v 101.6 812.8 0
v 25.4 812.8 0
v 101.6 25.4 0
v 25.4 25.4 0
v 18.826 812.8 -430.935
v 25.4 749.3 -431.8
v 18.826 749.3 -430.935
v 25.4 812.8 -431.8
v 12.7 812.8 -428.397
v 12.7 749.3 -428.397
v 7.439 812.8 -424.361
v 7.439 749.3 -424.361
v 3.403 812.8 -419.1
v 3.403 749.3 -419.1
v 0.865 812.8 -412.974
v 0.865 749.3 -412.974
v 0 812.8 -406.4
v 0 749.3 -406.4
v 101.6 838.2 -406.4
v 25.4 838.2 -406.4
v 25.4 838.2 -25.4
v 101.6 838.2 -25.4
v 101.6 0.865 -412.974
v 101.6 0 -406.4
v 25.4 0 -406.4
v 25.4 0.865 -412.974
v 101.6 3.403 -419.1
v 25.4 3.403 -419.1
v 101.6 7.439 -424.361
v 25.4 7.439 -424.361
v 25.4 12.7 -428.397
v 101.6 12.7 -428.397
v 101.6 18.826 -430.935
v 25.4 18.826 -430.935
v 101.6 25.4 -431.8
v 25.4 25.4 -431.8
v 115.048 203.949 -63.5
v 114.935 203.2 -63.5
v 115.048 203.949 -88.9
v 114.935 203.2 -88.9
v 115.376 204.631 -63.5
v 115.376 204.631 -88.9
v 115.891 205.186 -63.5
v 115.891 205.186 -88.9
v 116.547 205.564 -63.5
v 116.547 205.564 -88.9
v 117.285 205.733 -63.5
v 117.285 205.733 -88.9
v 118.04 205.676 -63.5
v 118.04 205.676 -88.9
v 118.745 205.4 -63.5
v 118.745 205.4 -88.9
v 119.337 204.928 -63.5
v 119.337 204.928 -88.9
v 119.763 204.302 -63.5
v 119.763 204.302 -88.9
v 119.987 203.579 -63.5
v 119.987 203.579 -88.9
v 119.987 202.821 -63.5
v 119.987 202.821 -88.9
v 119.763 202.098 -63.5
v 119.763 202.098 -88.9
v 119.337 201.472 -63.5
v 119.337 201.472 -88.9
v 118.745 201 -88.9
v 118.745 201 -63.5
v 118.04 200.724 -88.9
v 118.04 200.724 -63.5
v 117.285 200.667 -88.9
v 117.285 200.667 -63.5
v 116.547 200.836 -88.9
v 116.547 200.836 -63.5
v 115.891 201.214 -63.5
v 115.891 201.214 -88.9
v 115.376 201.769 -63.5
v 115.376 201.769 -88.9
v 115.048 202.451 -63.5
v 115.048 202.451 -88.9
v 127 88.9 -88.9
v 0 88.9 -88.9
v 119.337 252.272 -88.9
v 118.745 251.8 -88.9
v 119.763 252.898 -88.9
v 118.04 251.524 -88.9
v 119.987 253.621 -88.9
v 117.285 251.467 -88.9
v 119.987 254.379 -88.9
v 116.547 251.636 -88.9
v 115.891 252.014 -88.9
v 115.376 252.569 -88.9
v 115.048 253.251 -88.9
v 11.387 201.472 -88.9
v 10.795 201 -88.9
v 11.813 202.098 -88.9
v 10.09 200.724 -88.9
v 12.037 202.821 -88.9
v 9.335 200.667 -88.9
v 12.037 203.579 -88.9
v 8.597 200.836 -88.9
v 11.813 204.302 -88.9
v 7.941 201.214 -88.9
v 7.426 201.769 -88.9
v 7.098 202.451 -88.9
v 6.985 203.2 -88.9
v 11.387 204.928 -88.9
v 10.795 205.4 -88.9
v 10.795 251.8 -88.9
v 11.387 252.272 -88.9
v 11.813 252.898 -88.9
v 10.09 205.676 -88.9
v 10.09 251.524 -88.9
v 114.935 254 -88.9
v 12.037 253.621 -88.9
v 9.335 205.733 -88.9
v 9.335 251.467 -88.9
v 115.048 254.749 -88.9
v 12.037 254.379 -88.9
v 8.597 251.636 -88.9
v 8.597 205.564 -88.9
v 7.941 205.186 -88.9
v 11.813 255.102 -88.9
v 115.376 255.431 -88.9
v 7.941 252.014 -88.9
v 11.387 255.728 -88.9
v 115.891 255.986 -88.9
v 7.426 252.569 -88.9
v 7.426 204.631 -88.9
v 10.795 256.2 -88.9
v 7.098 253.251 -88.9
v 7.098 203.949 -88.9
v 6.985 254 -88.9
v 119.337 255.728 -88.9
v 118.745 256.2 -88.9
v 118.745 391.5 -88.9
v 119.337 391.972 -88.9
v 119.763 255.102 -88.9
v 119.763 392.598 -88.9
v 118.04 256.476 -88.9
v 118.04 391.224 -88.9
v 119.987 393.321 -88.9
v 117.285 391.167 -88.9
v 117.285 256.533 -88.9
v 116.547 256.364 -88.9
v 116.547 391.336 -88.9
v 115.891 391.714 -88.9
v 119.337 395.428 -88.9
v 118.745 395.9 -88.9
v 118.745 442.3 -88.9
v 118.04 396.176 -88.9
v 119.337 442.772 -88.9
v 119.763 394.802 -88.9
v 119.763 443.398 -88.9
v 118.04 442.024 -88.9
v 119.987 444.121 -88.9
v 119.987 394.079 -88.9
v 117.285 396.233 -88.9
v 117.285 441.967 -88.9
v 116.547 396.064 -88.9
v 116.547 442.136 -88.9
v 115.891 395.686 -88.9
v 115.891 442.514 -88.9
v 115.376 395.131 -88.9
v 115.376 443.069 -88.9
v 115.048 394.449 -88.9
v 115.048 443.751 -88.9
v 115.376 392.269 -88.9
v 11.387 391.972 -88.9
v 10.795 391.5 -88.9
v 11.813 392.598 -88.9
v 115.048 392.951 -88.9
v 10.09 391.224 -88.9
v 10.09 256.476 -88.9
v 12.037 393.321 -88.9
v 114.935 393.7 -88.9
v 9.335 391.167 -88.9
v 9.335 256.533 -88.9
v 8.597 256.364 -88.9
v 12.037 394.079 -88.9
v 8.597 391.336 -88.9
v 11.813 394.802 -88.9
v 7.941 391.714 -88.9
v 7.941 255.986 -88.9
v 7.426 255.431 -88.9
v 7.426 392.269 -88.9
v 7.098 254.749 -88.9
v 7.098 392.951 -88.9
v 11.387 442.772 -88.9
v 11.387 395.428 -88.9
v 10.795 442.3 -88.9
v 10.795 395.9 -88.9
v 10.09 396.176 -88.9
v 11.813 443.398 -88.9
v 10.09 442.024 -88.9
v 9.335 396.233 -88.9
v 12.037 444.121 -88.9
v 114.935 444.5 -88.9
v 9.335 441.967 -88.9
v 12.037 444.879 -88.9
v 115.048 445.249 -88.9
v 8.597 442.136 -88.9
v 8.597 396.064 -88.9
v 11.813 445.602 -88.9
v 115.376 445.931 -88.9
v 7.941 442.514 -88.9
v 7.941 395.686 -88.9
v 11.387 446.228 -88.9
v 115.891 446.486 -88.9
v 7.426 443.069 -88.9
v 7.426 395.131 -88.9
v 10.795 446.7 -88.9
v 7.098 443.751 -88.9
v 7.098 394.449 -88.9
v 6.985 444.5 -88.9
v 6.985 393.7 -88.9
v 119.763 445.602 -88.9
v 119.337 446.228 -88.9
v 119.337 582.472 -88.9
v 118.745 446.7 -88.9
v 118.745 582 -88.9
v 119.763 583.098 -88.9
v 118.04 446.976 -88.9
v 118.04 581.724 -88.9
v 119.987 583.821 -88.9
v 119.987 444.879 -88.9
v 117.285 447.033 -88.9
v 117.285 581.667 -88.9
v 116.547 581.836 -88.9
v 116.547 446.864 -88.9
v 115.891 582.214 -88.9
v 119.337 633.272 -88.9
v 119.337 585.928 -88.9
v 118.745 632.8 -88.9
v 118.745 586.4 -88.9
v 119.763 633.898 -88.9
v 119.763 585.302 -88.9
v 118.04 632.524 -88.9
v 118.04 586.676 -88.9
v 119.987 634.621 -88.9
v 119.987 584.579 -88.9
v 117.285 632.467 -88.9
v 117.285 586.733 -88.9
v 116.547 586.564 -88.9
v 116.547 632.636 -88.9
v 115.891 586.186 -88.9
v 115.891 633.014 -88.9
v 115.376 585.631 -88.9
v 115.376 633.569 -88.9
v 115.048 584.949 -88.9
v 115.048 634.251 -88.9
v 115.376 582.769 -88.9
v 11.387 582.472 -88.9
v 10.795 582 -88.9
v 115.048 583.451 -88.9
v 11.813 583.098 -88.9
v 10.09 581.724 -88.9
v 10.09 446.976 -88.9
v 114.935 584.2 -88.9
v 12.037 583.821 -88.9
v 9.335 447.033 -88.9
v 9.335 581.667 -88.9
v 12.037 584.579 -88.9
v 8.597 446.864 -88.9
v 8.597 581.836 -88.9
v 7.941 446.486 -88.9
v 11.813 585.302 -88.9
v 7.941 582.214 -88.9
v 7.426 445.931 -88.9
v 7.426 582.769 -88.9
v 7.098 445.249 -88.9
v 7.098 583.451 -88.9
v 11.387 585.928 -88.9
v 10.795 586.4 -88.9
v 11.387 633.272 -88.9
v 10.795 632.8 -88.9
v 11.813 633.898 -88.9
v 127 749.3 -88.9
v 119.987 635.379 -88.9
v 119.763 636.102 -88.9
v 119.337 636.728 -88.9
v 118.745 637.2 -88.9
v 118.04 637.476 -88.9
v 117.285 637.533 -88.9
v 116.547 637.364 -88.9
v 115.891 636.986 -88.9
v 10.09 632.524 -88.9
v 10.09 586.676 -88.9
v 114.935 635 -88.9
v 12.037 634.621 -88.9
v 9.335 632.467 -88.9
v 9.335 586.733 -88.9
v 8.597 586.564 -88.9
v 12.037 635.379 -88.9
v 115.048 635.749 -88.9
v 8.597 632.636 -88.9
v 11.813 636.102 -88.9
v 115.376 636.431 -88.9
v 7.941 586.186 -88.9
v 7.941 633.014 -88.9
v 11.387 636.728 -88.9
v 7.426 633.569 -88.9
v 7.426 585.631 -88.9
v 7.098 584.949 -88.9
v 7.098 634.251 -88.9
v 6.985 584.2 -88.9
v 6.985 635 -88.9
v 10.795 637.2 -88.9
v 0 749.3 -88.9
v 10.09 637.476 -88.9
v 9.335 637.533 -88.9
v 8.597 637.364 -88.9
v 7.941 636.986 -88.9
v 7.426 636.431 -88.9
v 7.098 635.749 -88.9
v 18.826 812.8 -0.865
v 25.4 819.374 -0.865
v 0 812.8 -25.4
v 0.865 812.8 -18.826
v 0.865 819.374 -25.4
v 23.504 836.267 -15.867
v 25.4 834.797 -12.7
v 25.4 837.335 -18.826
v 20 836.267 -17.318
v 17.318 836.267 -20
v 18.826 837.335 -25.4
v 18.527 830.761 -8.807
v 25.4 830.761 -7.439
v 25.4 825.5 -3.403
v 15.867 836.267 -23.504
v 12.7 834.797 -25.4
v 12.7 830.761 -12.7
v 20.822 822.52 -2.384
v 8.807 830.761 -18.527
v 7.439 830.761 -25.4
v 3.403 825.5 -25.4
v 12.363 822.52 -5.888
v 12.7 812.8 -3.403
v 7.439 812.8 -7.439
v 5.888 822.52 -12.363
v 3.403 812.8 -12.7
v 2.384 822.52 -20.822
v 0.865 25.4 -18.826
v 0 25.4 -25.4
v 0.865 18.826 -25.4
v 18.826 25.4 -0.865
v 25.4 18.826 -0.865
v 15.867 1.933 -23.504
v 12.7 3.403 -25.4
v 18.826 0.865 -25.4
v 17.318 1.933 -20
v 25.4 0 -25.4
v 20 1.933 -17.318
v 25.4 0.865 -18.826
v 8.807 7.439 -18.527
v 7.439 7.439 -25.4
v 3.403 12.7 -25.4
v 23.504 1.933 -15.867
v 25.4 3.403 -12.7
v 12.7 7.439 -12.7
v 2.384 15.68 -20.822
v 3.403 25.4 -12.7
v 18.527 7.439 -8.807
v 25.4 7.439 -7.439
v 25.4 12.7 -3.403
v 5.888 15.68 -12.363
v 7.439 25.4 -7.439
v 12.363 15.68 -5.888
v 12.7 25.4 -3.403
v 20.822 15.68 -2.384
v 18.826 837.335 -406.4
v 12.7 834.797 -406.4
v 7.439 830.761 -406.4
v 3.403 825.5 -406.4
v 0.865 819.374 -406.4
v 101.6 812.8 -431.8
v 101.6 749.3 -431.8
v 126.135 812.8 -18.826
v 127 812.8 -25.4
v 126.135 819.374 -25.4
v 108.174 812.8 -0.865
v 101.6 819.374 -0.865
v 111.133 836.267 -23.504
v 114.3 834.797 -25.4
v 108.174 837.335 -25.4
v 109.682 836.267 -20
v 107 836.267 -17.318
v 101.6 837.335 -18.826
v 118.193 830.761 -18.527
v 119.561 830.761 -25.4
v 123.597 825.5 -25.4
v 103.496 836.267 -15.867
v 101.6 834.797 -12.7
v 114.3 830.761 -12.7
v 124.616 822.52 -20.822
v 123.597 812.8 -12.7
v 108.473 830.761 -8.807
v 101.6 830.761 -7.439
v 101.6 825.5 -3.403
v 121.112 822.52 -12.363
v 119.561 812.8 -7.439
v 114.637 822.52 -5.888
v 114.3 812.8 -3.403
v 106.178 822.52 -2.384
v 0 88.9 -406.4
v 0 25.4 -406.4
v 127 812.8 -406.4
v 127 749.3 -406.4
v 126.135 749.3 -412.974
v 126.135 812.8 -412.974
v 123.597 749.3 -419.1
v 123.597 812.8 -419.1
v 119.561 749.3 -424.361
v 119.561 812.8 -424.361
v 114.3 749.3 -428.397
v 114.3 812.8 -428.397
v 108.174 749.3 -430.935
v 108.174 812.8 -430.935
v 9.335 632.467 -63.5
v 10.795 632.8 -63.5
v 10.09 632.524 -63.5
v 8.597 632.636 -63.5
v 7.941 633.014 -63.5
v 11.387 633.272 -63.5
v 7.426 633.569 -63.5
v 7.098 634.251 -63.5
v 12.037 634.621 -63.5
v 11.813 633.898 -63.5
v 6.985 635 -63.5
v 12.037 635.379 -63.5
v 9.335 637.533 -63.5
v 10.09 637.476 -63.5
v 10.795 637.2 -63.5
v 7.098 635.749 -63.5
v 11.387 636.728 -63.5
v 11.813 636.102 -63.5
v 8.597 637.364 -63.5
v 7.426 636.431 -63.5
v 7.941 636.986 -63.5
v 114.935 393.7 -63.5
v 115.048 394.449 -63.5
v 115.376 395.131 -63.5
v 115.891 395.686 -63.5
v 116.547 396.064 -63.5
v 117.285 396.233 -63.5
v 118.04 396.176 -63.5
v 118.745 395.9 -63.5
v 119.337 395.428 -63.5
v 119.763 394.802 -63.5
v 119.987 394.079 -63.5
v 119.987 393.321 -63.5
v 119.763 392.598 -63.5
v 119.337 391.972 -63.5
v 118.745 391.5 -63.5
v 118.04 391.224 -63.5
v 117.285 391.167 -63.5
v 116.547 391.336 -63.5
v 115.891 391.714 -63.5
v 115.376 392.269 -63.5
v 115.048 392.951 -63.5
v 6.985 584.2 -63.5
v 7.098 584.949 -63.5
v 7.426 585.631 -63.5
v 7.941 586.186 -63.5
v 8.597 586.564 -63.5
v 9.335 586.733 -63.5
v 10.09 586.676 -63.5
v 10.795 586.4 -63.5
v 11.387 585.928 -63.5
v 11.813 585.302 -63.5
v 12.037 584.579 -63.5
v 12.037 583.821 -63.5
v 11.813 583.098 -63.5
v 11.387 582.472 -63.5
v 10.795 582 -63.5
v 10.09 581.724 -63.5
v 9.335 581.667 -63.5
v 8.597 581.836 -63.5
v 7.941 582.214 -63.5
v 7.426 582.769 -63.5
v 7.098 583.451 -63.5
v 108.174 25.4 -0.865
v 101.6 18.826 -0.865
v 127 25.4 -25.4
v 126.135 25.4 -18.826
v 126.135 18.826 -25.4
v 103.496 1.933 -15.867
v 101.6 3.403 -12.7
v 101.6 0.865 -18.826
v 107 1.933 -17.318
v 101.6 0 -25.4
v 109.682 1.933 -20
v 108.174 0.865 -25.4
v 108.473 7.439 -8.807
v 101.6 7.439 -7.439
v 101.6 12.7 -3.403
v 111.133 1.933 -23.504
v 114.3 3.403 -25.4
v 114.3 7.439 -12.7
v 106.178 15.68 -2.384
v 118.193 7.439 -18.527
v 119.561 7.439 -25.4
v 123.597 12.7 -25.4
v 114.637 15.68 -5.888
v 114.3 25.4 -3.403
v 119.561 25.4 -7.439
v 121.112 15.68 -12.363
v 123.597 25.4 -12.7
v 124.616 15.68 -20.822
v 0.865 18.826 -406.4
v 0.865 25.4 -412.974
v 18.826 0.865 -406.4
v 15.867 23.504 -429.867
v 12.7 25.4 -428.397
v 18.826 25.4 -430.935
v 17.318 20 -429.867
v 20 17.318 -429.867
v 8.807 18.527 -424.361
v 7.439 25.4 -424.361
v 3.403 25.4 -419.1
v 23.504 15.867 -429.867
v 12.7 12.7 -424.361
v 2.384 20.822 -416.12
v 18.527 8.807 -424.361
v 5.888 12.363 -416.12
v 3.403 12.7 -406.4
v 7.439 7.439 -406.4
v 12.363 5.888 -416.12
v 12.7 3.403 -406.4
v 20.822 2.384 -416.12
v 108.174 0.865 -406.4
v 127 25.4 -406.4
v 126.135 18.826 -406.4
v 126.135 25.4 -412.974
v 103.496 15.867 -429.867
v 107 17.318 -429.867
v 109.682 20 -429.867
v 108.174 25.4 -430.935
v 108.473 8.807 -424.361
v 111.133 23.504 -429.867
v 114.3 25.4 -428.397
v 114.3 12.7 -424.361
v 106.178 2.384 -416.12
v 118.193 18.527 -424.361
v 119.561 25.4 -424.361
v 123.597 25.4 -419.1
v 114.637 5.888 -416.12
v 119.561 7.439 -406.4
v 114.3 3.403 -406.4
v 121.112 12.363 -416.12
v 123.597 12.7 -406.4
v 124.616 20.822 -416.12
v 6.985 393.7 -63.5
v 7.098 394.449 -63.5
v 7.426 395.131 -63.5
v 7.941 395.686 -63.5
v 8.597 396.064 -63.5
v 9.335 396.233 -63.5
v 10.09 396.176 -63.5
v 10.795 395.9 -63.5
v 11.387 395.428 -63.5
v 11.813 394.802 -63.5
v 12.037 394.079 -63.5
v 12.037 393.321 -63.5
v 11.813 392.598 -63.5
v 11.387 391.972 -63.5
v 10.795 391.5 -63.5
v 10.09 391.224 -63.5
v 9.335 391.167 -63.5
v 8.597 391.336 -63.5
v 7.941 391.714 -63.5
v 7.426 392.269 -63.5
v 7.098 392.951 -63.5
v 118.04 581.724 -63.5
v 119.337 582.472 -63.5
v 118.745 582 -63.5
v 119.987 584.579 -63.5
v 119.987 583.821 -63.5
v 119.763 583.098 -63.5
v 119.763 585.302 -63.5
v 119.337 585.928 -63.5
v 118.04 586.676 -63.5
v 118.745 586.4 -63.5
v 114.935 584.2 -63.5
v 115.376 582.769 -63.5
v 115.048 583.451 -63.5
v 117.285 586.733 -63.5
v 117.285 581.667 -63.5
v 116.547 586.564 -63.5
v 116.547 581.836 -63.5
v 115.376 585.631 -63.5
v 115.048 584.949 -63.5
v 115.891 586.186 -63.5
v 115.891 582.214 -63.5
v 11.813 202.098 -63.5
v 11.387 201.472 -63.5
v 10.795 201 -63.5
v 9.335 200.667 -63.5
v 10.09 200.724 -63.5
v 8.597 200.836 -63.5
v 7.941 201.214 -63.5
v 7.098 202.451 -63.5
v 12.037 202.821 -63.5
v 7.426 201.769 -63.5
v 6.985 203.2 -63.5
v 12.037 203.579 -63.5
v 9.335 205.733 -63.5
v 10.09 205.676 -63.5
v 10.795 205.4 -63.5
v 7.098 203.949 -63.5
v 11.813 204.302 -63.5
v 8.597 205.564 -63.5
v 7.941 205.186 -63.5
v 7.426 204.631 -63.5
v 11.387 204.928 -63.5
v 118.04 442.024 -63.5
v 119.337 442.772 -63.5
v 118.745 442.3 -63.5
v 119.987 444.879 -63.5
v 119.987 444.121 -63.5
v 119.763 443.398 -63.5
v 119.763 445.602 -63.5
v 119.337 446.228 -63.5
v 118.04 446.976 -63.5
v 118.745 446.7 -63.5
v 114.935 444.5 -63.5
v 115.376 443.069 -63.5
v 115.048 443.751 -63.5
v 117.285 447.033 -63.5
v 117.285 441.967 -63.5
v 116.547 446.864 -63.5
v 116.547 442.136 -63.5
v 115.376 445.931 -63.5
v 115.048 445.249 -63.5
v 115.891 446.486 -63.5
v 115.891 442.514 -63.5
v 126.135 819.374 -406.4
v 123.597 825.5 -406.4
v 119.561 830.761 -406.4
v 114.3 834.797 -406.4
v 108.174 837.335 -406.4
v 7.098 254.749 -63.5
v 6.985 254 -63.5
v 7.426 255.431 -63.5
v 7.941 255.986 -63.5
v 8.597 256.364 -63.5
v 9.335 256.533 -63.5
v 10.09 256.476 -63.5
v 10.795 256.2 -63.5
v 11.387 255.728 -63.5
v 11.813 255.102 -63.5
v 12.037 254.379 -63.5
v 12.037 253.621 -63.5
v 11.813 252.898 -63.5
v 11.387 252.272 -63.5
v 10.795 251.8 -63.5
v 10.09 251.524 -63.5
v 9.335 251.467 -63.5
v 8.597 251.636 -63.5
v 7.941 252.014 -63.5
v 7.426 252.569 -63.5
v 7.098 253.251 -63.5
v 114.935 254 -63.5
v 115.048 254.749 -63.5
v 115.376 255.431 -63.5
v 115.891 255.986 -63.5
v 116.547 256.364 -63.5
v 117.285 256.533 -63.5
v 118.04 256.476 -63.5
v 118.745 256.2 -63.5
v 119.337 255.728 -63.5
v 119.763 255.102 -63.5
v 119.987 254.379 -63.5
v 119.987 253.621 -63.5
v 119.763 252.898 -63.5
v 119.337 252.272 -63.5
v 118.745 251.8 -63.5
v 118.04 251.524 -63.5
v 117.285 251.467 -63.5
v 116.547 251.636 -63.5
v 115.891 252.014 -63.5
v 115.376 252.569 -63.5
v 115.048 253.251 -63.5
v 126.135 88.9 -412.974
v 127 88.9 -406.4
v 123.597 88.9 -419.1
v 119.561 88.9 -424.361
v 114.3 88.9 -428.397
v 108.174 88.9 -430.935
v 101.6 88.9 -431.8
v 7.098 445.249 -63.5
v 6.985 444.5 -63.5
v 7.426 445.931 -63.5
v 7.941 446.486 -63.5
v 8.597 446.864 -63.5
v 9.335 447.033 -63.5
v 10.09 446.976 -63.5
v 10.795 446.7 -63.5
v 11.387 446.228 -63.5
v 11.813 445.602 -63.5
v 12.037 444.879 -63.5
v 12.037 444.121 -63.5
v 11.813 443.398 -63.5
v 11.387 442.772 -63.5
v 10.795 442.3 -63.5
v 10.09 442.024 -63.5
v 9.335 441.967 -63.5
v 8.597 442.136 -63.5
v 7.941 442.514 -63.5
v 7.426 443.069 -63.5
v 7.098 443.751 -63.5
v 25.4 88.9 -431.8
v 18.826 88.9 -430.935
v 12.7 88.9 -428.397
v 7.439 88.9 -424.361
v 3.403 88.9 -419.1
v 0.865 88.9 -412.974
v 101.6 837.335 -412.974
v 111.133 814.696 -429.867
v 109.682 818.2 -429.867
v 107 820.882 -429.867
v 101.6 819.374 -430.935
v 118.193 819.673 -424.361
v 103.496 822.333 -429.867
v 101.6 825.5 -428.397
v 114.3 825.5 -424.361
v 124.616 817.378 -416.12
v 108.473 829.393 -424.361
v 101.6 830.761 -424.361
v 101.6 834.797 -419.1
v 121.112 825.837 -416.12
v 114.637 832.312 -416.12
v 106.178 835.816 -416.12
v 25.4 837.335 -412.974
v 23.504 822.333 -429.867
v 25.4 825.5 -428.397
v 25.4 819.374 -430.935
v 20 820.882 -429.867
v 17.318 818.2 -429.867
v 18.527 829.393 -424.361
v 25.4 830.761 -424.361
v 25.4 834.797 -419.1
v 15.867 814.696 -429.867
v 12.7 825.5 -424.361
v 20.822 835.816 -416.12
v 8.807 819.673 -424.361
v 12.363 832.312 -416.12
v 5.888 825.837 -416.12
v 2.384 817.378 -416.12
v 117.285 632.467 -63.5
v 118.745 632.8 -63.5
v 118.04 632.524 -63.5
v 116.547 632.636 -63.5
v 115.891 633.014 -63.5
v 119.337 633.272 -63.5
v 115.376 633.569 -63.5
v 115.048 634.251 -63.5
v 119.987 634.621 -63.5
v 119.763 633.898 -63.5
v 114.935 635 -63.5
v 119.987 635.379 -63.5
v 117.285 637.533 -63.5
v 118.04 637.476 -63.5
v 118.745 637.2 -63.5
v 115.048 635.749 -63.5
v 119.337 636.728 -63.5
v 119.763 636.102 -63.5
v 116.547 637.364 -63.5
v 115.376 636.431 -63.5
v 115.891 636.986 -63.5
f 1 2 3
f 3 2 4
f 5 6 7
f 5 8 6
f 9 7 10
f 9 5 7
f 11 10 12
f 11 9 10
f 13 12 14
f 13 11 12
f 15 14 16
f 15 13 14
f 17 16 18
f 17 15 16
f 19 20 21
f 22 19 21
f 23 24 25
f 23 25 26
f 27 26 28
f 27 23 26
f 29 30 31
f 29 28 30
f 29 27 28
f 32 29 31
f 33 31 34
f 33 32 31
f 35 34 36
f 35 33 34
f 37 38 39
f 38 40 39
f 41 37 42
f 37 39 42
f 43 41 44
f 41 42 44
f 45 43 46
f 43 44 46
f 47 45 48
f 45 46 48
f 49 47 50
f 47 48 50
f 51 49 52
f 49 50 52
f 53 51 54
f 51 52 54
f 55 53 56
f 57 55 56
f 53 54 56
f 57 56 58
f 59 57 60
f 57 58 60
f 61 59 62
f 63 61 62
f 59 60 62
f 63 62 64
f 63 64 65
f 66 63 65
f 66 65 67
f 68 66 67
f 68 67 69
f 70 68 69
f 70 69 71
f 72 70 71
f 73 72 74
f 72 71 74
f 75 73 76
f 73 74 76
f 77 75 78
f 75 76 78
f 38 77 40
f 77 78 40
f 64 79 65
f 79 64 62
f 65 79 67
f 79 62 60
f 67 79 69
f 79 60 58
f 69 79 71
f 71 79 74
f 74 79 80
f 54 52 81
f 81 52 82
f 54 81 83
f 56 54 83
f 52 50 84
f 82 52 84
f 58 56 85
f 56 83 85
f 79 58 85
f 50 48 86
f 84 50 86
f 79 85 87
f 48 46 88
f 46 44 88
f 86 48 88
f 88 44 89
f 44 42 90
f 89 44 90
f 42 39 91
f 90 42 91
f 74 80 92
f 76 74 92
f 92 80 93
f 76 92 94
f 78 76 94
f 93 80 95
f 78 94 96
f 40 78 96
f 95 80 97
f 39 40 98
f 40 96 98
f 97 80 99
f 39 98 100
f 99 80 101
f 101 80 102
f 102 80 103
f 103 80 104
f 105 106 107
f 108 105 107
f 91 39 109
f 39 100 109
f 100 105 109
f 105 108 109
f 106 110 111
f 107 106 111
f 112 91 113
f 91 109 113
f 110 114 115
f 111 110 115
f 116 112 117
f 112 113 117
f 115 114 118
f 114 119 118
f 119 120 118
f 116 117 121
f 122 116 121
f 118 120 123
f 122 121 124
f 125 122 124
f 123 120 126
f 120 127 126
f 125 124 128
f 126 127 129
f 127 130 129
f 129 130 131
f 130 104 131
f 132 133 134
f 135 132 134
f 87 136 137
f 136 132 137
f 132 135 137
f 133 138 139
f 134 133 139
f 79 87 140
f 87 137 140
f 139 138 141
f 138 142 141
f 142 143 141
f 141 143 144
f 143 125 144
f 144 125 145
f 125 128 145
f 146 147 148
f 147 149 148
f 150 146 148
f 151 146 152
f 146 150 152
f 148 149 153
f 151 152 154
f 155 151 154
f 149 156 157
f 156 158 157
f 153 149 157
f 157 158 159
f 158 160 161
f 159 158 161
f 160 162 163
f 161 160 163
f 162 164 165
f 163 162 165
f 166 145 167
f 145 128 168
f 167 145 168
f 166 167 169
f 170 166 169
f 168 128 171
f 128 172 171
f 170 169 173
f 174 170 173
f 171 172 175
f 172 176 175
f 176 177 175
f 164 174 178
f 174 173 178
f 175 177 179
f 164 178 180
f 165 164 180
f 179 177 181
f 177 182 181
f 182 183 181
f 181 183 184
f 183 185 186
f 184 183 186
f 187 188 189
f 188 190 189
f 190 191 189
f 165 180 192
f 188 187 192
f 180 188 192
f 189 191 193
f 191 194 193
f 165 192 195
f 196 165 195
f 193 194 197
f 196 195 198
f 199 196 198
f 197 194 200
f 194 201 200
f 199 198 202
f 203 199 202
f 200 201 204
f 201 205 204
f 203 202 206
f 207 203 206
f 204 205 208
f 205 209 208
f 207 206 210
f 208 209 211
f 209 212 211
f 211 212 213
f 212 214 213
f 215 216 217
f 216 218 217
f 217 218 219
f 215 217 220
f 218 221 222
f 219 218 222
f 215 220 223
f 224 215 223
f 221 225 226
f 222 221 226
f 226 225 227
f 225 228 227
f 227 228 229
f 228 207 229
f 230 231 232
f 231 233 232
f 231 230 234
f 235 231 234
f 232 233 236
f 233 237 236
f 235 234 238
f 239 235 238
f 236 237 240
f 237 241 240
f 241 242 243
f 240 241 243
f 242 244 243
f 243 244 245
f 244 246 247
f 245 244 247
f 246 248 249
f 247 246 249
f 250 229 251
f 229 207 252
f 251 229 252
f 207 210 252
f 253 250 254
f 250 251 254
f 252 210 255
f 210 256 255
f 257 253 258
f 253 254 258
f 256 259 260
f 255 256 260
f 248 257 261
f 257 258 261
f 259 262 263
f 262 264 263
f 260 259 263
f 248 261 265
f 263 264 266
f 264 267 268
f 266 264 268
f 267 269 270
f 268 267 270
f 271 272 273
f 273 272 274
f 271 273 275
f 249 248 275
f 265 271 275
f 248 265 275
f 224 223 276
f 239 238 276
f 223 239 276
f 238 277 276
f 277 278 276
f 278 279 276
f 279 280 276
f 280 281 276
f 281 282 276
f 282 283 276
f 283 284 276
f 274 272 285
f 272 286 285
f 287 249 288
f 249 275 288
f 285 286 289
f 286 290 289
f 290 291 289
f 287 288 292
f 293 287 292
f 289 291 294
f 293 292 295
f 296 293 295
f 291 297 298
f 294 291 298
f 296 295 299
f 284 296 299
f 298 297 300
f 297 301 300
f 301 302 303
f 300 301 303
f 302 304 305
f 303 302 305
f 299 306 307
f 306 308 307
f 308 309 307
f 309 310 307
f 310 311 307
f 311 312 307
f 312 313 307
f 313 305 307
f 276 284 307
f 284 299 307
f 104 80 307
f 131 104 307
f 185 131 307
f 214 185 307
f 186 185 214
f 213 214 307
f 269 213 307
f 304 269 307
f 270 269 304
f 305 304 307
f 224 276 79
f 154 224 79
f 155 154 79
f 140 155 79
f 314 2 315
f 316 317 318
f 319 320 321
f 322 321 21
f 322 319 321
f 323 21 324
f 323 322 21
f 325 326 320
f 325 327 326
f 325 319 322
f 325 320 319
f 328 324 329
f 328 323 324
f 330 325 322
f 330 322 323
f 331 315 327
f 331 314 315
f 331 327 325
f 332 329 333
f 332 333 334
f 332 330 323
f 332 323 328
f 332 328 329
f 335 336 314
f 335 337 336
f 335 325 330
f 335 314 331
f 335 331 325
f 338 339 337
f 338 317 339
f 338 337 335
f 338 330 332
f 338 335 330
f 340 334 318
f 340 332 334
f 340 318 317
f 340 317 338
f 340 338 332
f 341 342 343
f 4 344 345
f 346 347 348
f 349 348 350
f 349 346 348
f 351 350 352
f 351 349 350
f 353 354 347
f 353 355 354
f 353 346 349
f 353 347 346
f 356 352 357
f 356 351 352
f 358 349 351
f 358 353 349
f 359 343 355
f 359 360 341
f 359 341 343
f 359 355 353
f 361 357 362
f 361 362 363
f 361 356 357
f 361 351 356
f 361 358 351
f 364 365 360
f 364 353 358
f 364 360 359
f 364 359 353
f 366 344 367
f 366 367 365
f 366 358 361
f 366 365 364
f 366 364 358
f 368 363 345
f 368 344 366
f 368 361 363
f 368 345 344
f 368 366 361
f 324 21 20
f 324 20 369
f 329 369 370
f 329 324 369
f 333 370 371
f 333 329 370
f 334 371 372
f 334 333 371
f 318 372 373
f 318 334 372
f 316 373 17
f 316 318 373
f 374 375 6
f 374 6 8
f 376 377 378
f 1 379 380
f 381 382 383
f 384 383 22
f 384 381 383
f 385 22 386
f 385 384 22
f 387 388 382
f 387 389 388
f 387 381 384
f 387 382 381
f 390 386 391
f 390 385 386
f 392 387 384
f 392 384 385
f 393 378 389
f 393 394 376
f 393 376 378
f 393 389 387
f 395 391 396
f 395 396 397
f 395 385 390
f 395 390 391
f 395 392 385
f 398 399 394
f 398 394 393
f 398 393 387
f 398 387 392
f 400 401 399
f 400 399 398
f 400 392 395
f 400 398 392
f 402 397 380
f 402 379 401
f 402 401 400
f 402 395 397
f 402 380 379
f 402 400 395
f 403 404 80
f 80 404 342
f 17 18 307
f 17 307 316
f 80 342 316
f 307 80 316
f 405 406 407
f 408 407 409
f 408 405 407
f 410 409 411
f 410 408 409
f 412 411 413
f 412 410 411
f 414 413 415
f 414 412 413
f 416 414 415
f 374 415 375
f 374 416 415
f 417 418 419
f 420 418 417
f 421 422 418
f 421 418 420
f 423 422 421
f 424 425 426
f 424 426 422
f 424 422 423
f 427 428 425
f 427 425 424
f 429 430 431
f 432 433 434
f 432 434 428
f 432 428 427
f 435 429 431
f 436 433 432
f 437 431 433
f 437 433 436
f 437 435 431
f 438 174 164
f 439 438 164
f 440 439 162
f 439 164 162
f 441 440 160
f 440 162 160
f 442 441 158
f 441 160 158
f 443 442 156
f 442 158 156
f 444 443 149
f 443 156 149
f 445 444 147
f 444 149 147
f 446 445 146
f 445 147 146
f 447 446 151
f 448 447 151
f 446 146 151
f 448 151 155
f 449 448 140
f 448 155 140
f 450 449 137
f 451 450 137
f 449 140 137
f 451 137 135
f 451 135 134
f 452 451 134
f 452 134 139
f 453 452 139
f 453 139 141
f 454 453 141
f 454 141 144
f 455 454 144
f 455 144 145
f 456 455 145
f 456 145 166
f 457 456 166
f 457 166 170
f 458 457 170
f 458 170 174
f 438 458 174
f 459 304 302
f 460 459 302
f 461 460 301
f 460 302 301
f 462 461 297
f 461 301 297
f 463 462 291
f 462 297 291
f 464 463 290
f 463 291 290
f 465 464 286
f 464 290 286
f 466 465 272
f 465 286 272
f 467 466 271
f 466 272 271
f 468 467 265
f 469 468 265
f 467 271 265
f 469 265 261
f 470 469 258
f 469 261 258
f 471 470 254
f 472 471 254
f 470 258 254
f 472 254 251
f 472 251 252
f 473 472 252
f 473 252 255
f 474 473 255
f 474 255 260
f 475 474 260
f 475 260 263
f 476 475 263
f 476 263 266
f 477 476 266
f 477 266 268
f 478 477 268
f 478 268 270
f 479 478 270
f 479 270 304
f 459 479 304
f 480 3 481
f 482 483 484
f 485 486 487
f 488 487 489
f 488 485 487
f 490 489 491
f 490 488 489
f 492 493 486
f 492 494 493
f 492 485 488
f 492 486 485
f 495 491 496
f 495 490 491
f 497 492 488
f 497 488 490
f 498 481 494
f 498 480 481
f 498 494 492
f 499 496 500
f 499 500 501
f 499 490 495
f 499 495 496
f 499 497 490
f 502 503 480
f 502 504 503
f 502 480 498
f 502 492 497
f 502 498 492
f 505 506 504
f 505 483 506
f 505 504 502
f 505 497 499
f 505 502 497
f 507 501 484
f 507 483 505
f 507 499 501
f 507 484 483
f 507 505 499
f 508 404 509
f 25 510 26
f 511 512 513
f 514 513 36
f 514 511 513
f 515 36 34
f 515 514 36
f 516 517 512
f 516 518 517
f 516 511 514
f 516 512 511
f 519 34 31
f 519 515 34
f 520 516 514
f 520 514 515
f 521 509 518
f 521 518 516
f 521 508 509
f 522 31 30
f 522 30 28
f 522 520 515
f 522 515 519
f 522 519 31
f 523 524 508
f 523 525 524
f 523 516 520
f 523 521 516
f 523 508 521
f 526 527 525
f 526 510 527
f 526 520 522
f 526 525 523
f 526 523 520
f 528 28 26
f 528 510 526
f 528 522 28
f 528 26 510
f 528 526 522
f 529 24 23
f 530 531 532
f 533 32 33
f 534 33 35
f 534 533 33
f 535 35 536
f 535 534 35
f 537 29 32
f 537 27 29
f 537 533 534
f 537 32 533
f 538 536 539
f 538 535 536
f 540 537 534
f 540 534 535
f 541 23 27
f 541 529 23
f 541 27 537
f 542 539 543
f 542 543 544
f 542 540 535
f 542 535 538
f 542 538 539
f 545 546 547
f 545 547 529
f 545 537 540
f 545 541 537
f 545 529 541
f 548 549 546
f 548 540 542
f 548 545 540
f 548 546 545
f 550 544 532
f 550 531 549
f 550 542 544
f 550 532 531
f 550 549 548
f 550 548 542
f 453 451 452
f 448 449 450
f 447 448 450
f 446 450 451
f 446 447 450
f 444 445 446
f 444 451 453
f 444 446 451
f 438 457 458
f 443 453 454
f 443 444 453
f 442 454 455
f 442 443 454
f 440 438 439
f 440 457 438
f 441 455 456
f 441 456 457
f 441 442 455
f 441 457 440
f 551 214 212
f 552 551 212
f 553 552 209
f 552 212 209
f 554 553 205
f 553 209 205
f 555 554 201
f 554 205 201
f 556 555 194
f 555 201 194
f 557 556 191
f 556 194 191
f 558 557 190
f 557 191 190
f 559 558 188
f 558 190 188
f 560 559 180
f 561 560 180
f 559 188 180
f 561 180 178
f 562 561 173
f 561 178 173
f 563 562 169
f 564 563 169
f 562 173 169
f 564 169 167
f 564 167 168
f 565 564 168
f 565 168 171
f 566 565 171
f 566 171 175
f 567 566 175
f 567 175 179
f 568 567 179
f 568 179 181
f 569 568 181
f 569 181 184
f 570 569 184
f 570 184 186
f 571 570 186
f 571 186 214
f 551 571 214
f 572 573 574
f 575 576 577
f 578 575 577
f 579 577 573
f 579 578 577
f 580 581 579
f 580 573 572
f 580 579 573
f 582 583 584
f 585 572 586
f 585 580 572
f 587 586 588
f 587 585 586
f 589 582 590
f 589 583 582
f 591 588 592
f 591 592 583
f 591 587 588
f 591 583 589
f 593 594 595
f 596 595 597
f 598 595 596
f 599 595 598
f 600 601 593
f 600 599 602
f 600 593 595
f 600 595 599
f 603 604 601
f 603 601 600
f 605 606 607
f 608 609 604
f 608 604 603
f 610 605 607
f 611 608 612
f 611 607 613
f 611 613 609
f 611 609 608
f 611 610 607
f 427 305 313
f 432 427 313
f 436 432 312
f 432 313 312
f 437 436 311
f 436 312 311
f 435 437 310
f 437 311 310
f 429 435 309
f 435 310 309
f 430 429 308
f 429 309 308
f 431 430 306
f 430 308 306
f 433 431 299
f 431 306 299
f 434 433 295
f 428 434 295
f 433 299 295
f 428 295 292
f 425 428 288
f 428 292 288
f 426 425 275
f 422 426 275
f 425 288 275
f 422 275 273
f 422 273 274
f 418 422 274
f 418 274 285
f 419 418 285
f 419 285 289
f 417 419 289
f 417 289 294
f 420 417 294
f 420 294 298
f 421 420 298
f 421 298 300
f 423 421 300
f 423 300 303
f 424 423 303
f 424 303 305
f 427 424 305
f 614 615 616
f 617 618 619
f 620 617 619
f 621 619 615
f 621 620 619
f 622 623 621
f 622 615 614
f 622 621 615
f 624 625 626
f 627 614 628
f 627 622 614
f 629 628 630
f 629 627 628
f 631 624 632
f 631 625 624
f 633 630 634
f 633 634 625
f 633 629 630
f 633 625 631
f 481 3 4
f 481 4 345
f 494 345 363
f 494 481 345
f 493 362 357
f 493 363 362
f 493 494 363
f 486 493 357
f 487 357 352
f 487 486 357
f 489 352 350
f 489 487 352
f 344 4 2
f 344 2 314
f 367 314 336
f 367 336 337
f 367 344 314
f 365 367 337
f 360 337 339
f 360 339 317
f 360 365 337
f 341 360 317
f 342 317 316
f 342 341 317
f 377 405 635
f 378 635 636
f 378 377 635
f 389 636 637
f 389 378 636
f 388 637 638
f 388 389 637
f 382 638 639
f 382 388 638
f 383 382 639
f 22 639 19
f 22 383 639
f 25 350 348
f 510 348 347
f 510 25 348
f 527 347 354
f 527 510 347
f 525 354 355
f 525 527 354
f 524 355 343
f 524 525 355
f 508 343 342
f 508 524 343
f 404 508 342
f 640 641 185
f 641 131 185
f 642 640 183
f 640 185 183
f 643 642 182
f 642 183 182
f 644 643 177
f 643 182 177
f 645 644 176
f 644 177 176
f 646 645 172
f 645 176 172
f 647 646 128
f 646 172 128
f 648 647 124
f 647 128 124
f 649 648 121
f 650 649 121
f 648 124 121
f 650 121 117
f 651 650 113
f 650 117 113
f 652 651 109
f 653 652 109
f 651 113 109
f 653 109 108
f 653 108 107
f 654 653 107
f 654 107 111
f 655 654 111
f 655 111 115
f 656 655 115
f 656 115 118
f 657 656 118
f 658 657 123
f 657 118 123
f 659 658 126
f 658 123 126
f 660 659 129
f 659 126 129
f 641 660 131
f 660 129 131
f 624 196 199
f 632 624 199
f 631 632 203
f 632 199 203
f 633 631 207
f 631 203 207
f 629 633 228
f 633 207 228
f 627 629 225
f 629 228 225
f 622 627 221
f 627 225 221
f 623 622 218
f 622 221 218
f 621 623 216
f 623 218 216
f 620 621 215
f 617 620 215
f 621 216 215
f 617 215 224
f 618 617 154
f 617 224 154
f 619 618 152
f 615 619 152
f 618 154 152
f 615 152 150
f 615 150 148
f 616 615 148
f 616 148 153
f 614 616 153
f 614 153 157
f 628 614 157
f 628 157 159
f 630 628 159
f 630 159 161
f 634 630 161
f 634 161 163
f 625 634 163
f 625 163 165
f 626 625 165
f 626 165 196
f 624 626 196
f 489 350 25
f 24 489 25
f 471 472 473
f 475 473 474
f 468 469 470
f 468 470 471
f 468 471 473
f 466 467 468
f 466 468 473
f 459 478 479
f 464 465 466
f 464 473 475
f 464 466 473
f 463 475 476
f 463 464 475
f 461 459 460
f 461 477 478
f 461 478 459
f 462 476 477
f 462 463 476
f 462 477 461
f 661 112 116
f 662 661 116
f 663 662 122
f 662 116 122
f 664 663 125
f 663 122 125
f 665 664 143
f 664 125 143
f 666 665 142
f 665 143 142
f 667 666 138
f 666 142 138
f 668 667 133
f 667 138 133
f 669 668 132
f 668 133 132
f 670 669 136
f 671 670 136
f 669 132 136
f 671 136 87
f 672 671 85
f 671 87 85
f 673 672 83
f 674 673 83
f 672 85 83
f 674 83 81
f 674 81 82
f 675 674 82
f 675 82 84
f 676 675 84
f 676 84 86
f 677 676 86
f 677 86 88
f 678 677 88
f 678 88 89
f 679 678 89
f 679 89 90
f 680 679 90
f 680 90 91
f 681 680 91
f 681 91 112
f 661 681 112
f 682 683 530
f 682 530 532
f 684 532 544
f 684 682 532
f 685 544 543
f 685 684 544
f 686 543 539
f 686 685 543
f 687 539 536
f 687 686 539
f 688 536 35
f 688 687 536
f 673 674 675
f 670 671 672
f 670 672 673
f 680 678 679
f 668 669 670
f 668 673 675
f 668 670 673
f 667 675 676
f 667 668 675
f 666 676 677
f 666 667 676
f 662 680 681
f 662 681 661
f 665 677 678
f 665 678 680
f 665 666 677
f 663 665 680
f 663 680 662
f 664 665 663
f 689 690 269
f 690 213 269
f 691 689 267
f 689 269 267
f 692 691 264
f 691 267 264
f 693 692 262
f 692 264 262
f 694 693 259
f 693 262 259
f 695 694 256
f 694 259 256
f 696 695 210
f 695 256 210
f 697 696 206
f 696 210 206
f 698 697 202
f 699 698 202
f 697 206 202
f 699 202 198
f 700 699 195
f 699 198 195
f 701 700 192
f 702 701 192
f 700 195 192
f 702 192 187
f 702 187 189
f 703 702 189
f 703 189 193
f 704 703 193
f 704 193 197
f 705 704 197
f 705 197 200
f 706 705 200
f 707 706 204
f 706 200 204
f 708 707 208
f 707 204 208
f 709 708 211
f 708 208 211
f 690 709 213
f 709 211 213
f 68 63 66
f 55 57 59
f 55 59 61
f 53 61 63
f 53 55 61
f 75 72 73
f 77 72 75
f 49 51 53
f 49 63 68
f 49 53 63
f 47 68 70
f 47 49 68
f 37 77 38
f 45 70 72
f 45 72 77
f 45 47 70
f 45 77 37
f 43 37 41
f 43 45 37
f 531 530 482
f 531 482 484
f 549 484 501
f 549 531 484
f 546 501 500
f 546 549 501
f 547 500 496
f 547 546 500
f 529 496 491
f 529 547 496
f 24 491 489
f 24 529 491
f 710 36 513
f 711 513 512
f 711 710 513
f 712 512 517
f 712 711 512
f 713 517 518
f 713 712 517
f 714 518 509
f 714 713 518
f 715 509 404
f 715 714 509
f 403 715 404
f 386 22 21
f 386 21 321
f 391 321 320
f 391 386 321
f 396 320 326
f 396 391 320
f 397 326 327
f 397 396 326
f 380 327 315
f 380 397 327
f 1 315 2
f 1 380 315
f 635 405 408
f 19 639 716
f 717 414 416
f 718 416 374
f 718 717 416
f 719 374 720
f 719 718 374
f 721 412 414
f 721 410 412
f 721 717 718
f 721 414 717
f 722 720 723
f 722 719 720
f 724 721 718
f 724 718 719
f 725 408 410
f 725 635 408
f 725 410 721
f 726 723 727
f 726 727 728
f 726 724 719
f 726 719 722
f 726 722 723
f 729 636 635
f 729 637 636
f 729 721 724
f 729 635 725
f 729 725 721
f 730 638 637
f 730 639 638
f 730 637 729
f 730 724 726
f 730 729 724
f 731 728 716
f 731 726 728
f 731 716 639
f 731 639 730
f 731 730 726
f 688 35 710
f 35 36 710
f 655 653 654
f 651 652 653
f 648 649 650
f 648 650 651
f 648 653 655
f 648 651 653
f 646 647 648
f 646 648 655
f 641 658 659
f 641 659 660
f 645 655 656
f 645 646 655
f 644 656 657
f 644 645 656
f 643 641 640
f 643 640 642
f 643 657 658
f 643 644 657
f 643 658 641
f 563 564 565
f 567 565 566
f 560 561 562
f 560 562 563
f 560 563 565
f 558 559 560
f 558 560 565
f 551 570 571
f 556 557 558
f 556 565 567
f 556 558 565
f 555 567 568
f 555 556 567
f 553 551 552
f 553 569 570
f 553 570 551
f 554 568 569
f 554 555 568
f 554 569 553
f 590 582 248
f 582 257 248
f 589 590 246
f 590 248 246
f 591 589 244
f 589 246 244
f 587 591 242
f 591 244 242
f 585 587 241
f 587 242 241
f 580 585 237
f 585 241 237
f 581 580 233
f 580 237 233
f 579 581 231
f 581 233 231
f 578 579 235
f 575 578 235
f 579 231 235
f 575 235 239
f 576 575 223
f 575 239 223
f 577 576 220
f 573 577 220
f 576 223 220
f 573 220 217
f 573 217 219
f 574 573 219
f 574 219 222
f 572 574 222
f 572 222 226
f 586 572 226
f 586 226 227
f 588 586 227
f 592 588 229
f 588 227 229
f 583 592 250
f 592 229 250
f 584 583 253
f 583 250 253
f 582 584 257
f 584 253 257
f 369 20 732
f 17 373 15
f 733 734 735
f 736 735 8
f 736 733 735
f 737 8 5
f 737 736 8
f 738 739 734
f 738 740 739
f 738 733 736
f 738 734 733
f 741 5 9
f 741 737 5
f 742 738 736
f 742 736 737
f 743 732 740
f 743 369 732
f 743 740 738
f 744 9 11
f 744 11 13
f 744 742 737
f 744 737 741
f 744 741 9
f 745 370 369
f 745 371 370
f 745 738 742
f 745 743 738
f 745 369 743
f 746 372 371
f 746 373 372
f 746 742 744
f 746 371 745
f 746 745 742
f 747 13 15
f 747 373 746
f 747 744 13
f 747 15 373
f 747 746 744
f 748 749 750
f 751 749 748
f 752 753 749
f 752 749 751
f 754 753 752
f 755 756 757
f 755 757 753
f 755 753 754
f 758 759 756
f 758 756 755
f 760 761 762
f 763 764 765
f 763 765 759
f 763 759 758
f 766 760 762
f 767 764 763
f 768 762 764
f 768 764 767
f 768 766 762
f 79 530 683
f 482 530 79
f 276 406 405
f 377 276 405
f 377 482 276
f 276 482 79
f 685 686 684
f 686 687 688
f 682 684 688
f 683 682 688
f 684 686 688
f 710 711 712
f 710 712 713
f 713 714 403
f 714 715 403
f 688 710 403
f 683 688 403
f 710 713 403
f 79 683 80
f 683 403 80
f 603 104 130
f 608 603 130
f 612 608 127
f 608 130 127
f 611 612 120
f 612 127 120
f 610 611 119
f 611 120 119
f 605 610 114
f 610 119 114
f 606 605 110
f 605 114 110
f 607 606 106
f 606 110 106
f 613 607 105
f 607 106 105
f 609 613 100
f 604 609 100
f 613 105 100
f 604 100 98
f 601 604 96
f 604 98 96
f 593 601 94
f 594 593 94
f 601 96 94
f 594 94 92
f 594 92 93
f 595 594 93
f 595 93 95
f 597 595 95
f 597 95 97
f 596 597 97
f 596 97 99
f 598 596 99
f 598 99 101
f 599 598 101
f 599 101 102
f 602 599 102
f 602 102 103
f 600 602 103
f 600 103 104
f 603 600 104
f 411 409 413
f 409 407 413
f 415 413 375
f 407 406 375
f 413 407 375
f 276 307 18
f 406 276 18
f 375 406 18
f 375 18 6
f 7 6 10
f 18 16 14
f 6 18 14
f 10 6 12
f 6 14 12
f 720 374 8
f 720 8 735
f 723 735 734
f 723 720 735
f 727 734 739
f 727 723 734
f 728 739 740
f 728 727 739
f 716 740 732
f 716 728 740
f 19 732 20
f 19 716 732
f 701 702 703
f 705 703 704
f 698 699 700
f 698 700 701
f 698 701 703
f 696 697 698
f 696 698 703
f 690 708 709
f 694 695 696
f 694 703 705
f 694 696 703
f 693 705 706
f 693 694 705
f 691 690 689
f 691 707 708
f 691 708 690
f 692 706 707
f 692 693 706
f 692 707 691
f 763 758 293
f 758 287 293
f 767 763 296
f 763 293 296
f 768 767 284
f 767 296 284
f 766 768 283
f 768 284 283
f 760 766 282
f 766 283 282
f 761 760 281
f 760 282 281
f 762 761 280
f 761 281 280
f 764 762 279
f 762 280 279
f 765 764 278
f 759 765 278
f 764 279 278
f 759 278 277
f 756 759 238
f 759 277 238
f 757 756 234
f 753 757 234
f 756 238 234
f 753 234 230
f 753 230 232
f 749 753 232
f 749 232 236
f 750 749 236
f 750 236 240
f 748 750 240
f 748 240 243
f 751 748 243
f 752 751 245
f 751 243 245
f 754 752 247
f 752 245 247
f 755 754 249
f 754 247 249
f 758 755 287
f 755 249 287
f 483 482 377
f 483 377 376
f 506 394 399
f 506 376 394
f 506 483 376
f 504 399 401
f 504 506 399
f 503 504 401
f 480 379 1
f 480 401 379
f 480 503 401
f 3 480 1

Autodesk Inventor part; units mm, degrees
ref_plane "YZ Plane" through (0, 0, 0) normal (1, 0, 0) x (0, 1, 0)
ref_plane "XZ Plane" through (0, 0, 0) normal (0, 1, 0) x (-1, 0, 0)
ref_plane "XY Plane" through (0, 0, 0) normal (0, 0, 1) x (1, 0, 0)
sketch "Sketch1" plane through (0, 0, 0) normal (1, 0, 0) x (0, 1, 0)
  point P0 (0, 0)
sketch "Sketch2" plane through (0, 0, 0) normal (1, 0, 0) x (0, 1, 0)
  line L0 (0, 0) -> (0, -431.8)
  line L1 (0, -431.8) -> (88.9, -431.8)
  line L2 (88.9, -431.8) -> (88.9, -88.9)
  line L3 (88.9, -88.9) -> (749.3, -88.9)
  line L4 (749.3, -88.9) -> (749.3, -431.8)
  line L5 (749.3, -431.8) -> (838.2, -431.8)
  line L6 (838.2, -431.8) -> (838.2, 0)
  line L7 (838.2, 0) -> (0, 0)
  dimension "d0" = 660.4
  dimension "d1" = 342.9
  dimension "d2" = 342.9
  dimension "d3" = 88.9
  dimension "d4" = 88.9
  dimension "d5" = 88.9
extrude "Extrusion1" add sketch "Sketch2" along normal blind 127
fillet "Fillet1" radius 25.4 14 edges at (127, 419.1, 0) (0, 419.1, 0) (63.5, 838.2, 0) (127, 838.2, -215.9) (0, 838.2, -215.9) (63.5, 0, 0) (127, 0, -215.9) (127, 44.45, -431.8) (127, 793.75, -431.8) (63.5, 838.2, -431.8) (0, 793.75, -431.8) (0, 0, -215.9) (0, 44.45, -431.8) (63.5, 0, -431.8)
sketch "Sketch7" plane through (0, 88.9, -88.9) normal (0, 0, -1) x (-1, 0, 0)
  line L0 (-127, 0) -> (-127, 660.4) projected
  line L1 (-127, 0) -> (-127, 660.4)
  line L2 (-127, 660.4) -> (-127, 647.7)
  line L3 (-127, -63.5) -> (-127, 723.9) projected
  line L4 (-127, 0) -> (-127, 12.7)
  line L5 (-127, 12.7) -> (-127, 139.7)
  line L6 (-127, 139.7) -> (-127, 266.7)
  line L7 (-127, 266.7) -> (-127, 393.7)
  line L8 (-127, 393.7) -> (-127, 520.7)
  line L9 (-127, 520.7) -> (-127, 647.7)
  line L10 (-127, 330.2) -> (0, 330.2)
  line L11 (-127, 520.7) -> (0, 520.7)
  line L12 (0, 0) -> (0, 660.4) projected
  line L13 (-127, 139.7) -> (0, 139.7)
  line L14 (-127, 139.7) -> (-117.475, 139.7)
  line L15 (-127, 330.2) -> (-117.475, 330.2)
  line L16 (-127, 520.7) -> (-117.475, 520.7)
  line L17 (-117.475, 139.7) -> (-117.475, 165.1)
  line L18 (-117.475, 139.7) -> (-117.475, 114.3)
  line L19 (-117.475, 330.2) -> (-117.475, 304.8)
  line L20 (-117.475, 304.8) -> (-117.475, 355.6)
  line L21 (-117.475, 520.7) -> (-117.475, 495.3)
  line L22 (-117.475, 495.3) -> (-117.475, 546.1)
  circle A0 centre (-117.475, 114.3) radius 2.54
  circle A1 centre (-117.475, 165.1) radius 2.54
  circle A2 centre (-117.475, 304.8) radius 2.54
  circle A3 centre (-117.475, 355.6) radius 2.54
  circle A4 centre (-117.475, 495.3) radius 2.54
  circle A5 centre (-117.475, 546.1) radius 2.54
  line L23 (0, 139.7) -> (-9.525, 139.7)
  line L24 (-9.525, 139.7) -> (-9.525, 114.3)
  line L25 (-9.525, 114.3) -> (-9.525, 165.1)
  line L26 (-9.525, 304.8) -> (-9.525, 330.2)
  line L27 (-9.525, 330.2) -> (-9.525, 355.6)
  line L28 (-9.525, 495.3) -> (-9.525, 520.7)
  line L29 (-9.525, 520.7) -> (-9.525, 546.1)
  circle A6 centre (-9.525, 114.3) radius 2.54
  circle A7 centre (-9.525, 165.1) radius 2.54
  circle A8 centre (-9.525, 304.8) radius 2.54
  circle A9 centre (-9.525, 355.6) radius 2.54
  circle A10 centre (-9.525, 495.3) radius 2.54
  circle A11 centre (-9.525, 546.1) radius 2.54
  point P0 (0, -88.9)
  dimension "d52" = 12.7
  dimension "d53" = 12.7
  dimension "d54" = 127
  dimension "d55" = 127
  dimension "d56" = 127
  dimension "d57" = 127
  dimension "d58" = 9.525
  dimension "d59" = 25.4
  dimension "d60" = 25.4
  dimension "d61" = 25.4
  dimension "d62" = 50.8
  dimension "d63" = 25.4
  dimension "d64" = 50.8
  dimension "d65" = 5.08
  dimension "d66" = 9.525
extrude "Extrusion7" cut sketch "Sketch7" against normal blind 25.4 contours A5 | A11 | A6 | A0 | A1 | A7 | A8 | A2 | A3 | A9 | A10 | A4
properties part number "Bumper"
